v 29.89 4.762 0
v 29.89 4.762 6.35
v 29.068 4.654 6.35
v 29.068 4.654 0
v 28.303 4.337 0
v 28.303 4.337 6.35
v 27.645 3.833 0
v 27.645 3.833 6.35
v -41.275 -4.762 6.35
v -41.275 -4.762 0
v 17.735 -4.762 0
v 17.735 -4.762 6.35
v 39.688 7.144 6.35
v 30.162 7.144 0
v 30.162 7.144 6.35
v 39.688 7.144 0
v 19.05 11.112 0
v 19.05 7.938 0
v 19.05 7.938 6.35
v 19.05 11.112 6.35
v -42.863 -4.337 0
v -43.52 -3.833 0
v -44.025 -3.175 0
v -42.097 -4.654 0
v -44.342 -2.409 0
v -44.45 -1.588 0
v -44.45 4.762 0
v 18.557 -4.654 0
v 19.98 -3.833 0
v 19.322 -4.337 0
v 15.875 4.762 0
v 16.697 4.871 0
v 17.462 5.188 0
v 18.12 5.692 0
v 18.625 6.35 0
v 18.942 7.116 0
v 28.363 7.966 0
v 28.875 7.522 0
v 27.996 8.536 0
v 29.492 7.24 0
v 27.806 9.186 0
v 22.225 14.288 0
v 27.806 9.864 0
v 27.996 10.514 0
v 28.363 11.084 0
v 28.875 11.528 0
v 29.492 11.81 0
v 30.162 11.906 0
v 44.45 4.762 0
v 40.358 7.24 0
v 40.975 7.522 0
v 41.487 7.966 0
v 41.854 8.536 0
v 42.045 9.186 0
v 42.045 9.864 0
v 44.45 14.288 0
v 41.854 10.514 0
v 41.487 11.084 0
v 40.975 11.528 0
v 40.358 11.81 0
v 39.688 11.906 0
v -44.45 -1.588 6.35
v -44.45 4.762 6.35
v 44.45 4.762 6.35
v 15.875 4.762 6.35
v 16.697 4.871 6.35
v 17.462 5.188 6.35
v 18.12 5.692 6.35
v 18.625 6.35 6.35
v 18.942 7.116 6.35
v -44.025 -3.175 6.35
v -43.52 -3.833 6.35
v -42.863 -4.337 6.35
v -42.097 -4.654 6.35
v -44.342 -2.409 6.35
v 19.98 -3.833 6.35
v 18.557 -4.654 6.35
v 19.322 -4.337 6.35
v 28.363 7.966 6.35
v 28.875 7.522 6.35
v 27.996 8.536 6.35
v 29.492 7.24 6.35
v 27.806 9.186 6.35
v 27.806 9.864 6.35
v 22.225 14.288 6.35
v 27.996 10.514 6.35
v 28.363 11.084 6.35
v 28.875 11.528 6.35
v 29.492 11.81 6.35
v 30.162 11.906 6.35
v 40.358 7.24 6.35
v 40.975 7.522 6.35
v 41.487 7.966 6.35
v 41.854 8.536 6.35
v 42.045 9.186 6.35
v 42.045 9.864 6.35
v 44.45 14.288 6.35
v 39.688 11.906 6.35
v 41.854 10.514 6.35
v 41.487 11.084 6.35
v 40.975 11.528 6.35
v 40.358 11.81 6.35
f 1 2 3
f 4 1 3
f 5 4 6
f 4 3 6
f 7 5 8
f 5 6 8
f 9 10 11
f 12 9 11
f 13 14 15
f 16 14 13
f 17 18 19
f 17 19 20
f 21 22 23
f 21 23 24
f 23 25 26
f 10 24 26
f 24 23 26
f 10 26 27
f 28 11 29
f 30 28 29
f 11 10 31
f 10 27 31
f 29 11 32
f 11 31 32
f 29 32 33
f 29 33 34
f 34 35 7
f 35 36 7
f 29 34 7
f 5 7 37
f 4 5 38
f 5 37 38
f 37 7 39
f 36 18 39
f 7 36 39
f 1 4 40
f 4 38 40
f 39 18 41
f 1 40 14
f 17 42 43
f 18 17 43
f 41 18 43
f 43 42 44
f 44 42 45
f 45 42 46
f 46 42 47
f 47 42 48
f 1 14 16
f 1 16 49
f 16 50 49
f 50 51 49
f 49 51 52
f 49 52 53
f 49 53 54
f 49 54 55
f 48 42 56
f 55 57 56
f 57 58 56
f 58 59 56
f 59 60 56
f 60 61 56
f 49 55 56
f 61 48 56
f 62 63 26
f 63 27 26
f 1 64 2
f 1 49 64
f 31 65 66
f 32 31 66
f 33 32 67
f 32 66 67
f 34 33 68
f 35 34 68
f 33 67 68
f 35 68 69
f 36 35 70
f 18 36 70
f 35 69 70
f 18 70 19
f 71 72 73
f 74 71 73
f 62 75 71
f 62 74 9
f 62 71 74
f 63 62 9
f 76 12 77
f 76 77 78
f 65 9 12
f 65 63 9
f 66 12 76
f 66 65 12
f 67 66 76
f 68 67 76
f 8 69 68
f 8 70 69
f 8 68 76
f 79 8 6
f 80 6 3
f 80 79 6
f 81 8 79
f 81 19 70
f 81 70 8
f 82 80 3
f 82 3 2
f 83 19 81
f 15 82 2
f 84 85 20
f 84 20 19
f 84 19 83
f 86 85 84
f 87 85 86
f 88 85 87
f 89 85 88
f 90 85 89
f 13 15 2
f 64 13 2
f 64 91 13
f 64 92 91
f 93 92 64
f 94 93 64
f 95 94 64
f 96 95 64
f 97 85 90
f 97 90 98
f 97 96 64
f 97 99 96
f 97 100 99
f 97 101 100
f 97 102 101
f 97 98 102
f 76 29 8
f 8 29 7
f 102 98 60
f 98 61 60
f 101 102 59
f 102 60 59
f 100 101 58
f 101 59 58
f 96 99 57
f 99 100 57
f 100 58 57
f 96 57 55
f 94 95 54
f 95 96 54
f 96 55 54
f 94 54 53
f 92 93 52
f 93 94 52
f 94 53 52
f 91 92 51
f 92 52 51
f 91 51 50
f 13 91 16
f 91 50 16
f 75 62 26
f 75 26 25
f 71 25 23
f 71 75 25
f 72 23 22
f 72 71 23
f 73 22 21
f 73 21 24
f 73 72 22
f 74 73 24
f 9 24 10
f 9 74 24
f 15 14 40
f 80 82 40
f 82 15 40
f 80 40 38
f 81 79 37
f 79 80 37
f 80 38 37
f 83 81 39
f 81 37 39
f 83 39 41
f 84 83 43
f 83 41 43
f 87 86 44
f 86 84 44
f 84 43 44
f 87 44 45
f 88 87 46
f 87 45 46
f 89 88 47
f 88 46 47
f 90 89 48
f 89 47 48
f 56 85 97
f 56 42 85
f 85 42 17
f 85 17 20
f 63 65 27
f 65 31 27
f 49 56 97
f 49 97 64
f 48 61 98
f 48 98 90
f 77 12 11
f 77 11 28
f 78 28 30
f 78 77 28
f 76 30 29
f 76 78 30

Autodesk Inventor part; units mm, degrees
ref_plane "YZ Plane" through (0, 0, 0) normal (1, 0, 0) x (0, 1, 0)
ref_plane "XZ Plane" through (0, 0, 0) normal (0, 1, 0) x (-1, 0, 0)
ref_plane "XY Plane" through (0, 0, 0) normal (0, 0, 1) x (1, 0, 0)
sketch "Sketch1" plane through (0, 0, 0) normal (0, 0, 1) x (1, 0, 0)
  line L0 (-44.45, -4.7625) -> (44.45, -4.7625)
  line L1 (44.45, -4.7625) -> (44.45, 4.7625)
  line L2 (44.45, 4.7625) -> (-44.45, 4.7625)
  line L3 (-44.45, 4.7625) -> (-44.45, -4.7625)
  line L4 (-44.45, -4.7625) -> (44.45, 4.7625) construction
  line L5 (44.45, -4.7625) -> (-44.45, 4.7625) construction
  line L6 (44.45, 4.7625) -> (19.05, 4.7625)
  line L7 (19.05, 4.7625) -> (19.05, 14.2875)
  line L8 (19.05, 14.2875) -> (44.45, 14.2875)
  line L9 (44.45, 14.2875) -> (44.45, 4.7625)
  line L10 (19.05, -4.7625) -> (28.575, 4.7625)
  line L11 (44.45, 9.525) -> (19.05, 9.525) construction
  line L12 (25.4, 14.2875) -> (25.4, 4.7625) construction
  circle A0 centre (39.6875, 9.525) radius 1.7526 construction
  circle A1 centre (30.1625, 9.525) radius 1.7526 construction
  line L13 (39.6875, 9.525) -> (30.1625, 9.525) construction
  line L14 (39.6875, 11.9063) -> (30.1625, 11.9062)
  line L15 (30.1625, 7.1437) -> (39.6875, 7.1437)
  arc A2 (39.6875, 7.1437) -> (39.6875, 11.9063) centre (39.6875, 9.525) ccw
  arc A3 (30.1625, 11.9062) -> (30.1625, 7.1437) centre (30.1625, 9.525) ccw
  point P0 (0, 0)
  point P1 (19.05, 4.7625)
  point P2 (34.925, 9.525)
  dimension "d0" = 88.9
  dimension "d1" = 9.525
  dimension "d2" = 25.4
  dimension "d3" = 9.525
  dimension "d4" = 45
  dimension "d11" = 25.4
  dimension "d18" = 19.05
  dimension "d19" = 3.5052
  dimension "d20" = 4.7625
  dimension "d21" = 3.5052
  dimension "d22" = 4.7625
  dimension "d23" = 4.7625
extrude "Extrusion1" add sketch "Sketch1" along normal blind 6.35 contours L3 L2 L10 L0 | L2 L7 L8 L9
fillet "Fillet1" radius 3.175 3 edges at (19.05, 4.7625, 3.175) (28.575, 4.7625, 3.175) (19.05, -4.7625, 3.175)
chamfer "Chamfer2" distance 3.175 angle 45 1 edges at (19.05, 14.2875, 3.175)
fillet "Fillet4" radius 3.175 1 edges at (-44.45, -4.7625, 3.175)
equation "\"d22\" = d20"
properties part number "Teeth" material "Aluminum 6061"
